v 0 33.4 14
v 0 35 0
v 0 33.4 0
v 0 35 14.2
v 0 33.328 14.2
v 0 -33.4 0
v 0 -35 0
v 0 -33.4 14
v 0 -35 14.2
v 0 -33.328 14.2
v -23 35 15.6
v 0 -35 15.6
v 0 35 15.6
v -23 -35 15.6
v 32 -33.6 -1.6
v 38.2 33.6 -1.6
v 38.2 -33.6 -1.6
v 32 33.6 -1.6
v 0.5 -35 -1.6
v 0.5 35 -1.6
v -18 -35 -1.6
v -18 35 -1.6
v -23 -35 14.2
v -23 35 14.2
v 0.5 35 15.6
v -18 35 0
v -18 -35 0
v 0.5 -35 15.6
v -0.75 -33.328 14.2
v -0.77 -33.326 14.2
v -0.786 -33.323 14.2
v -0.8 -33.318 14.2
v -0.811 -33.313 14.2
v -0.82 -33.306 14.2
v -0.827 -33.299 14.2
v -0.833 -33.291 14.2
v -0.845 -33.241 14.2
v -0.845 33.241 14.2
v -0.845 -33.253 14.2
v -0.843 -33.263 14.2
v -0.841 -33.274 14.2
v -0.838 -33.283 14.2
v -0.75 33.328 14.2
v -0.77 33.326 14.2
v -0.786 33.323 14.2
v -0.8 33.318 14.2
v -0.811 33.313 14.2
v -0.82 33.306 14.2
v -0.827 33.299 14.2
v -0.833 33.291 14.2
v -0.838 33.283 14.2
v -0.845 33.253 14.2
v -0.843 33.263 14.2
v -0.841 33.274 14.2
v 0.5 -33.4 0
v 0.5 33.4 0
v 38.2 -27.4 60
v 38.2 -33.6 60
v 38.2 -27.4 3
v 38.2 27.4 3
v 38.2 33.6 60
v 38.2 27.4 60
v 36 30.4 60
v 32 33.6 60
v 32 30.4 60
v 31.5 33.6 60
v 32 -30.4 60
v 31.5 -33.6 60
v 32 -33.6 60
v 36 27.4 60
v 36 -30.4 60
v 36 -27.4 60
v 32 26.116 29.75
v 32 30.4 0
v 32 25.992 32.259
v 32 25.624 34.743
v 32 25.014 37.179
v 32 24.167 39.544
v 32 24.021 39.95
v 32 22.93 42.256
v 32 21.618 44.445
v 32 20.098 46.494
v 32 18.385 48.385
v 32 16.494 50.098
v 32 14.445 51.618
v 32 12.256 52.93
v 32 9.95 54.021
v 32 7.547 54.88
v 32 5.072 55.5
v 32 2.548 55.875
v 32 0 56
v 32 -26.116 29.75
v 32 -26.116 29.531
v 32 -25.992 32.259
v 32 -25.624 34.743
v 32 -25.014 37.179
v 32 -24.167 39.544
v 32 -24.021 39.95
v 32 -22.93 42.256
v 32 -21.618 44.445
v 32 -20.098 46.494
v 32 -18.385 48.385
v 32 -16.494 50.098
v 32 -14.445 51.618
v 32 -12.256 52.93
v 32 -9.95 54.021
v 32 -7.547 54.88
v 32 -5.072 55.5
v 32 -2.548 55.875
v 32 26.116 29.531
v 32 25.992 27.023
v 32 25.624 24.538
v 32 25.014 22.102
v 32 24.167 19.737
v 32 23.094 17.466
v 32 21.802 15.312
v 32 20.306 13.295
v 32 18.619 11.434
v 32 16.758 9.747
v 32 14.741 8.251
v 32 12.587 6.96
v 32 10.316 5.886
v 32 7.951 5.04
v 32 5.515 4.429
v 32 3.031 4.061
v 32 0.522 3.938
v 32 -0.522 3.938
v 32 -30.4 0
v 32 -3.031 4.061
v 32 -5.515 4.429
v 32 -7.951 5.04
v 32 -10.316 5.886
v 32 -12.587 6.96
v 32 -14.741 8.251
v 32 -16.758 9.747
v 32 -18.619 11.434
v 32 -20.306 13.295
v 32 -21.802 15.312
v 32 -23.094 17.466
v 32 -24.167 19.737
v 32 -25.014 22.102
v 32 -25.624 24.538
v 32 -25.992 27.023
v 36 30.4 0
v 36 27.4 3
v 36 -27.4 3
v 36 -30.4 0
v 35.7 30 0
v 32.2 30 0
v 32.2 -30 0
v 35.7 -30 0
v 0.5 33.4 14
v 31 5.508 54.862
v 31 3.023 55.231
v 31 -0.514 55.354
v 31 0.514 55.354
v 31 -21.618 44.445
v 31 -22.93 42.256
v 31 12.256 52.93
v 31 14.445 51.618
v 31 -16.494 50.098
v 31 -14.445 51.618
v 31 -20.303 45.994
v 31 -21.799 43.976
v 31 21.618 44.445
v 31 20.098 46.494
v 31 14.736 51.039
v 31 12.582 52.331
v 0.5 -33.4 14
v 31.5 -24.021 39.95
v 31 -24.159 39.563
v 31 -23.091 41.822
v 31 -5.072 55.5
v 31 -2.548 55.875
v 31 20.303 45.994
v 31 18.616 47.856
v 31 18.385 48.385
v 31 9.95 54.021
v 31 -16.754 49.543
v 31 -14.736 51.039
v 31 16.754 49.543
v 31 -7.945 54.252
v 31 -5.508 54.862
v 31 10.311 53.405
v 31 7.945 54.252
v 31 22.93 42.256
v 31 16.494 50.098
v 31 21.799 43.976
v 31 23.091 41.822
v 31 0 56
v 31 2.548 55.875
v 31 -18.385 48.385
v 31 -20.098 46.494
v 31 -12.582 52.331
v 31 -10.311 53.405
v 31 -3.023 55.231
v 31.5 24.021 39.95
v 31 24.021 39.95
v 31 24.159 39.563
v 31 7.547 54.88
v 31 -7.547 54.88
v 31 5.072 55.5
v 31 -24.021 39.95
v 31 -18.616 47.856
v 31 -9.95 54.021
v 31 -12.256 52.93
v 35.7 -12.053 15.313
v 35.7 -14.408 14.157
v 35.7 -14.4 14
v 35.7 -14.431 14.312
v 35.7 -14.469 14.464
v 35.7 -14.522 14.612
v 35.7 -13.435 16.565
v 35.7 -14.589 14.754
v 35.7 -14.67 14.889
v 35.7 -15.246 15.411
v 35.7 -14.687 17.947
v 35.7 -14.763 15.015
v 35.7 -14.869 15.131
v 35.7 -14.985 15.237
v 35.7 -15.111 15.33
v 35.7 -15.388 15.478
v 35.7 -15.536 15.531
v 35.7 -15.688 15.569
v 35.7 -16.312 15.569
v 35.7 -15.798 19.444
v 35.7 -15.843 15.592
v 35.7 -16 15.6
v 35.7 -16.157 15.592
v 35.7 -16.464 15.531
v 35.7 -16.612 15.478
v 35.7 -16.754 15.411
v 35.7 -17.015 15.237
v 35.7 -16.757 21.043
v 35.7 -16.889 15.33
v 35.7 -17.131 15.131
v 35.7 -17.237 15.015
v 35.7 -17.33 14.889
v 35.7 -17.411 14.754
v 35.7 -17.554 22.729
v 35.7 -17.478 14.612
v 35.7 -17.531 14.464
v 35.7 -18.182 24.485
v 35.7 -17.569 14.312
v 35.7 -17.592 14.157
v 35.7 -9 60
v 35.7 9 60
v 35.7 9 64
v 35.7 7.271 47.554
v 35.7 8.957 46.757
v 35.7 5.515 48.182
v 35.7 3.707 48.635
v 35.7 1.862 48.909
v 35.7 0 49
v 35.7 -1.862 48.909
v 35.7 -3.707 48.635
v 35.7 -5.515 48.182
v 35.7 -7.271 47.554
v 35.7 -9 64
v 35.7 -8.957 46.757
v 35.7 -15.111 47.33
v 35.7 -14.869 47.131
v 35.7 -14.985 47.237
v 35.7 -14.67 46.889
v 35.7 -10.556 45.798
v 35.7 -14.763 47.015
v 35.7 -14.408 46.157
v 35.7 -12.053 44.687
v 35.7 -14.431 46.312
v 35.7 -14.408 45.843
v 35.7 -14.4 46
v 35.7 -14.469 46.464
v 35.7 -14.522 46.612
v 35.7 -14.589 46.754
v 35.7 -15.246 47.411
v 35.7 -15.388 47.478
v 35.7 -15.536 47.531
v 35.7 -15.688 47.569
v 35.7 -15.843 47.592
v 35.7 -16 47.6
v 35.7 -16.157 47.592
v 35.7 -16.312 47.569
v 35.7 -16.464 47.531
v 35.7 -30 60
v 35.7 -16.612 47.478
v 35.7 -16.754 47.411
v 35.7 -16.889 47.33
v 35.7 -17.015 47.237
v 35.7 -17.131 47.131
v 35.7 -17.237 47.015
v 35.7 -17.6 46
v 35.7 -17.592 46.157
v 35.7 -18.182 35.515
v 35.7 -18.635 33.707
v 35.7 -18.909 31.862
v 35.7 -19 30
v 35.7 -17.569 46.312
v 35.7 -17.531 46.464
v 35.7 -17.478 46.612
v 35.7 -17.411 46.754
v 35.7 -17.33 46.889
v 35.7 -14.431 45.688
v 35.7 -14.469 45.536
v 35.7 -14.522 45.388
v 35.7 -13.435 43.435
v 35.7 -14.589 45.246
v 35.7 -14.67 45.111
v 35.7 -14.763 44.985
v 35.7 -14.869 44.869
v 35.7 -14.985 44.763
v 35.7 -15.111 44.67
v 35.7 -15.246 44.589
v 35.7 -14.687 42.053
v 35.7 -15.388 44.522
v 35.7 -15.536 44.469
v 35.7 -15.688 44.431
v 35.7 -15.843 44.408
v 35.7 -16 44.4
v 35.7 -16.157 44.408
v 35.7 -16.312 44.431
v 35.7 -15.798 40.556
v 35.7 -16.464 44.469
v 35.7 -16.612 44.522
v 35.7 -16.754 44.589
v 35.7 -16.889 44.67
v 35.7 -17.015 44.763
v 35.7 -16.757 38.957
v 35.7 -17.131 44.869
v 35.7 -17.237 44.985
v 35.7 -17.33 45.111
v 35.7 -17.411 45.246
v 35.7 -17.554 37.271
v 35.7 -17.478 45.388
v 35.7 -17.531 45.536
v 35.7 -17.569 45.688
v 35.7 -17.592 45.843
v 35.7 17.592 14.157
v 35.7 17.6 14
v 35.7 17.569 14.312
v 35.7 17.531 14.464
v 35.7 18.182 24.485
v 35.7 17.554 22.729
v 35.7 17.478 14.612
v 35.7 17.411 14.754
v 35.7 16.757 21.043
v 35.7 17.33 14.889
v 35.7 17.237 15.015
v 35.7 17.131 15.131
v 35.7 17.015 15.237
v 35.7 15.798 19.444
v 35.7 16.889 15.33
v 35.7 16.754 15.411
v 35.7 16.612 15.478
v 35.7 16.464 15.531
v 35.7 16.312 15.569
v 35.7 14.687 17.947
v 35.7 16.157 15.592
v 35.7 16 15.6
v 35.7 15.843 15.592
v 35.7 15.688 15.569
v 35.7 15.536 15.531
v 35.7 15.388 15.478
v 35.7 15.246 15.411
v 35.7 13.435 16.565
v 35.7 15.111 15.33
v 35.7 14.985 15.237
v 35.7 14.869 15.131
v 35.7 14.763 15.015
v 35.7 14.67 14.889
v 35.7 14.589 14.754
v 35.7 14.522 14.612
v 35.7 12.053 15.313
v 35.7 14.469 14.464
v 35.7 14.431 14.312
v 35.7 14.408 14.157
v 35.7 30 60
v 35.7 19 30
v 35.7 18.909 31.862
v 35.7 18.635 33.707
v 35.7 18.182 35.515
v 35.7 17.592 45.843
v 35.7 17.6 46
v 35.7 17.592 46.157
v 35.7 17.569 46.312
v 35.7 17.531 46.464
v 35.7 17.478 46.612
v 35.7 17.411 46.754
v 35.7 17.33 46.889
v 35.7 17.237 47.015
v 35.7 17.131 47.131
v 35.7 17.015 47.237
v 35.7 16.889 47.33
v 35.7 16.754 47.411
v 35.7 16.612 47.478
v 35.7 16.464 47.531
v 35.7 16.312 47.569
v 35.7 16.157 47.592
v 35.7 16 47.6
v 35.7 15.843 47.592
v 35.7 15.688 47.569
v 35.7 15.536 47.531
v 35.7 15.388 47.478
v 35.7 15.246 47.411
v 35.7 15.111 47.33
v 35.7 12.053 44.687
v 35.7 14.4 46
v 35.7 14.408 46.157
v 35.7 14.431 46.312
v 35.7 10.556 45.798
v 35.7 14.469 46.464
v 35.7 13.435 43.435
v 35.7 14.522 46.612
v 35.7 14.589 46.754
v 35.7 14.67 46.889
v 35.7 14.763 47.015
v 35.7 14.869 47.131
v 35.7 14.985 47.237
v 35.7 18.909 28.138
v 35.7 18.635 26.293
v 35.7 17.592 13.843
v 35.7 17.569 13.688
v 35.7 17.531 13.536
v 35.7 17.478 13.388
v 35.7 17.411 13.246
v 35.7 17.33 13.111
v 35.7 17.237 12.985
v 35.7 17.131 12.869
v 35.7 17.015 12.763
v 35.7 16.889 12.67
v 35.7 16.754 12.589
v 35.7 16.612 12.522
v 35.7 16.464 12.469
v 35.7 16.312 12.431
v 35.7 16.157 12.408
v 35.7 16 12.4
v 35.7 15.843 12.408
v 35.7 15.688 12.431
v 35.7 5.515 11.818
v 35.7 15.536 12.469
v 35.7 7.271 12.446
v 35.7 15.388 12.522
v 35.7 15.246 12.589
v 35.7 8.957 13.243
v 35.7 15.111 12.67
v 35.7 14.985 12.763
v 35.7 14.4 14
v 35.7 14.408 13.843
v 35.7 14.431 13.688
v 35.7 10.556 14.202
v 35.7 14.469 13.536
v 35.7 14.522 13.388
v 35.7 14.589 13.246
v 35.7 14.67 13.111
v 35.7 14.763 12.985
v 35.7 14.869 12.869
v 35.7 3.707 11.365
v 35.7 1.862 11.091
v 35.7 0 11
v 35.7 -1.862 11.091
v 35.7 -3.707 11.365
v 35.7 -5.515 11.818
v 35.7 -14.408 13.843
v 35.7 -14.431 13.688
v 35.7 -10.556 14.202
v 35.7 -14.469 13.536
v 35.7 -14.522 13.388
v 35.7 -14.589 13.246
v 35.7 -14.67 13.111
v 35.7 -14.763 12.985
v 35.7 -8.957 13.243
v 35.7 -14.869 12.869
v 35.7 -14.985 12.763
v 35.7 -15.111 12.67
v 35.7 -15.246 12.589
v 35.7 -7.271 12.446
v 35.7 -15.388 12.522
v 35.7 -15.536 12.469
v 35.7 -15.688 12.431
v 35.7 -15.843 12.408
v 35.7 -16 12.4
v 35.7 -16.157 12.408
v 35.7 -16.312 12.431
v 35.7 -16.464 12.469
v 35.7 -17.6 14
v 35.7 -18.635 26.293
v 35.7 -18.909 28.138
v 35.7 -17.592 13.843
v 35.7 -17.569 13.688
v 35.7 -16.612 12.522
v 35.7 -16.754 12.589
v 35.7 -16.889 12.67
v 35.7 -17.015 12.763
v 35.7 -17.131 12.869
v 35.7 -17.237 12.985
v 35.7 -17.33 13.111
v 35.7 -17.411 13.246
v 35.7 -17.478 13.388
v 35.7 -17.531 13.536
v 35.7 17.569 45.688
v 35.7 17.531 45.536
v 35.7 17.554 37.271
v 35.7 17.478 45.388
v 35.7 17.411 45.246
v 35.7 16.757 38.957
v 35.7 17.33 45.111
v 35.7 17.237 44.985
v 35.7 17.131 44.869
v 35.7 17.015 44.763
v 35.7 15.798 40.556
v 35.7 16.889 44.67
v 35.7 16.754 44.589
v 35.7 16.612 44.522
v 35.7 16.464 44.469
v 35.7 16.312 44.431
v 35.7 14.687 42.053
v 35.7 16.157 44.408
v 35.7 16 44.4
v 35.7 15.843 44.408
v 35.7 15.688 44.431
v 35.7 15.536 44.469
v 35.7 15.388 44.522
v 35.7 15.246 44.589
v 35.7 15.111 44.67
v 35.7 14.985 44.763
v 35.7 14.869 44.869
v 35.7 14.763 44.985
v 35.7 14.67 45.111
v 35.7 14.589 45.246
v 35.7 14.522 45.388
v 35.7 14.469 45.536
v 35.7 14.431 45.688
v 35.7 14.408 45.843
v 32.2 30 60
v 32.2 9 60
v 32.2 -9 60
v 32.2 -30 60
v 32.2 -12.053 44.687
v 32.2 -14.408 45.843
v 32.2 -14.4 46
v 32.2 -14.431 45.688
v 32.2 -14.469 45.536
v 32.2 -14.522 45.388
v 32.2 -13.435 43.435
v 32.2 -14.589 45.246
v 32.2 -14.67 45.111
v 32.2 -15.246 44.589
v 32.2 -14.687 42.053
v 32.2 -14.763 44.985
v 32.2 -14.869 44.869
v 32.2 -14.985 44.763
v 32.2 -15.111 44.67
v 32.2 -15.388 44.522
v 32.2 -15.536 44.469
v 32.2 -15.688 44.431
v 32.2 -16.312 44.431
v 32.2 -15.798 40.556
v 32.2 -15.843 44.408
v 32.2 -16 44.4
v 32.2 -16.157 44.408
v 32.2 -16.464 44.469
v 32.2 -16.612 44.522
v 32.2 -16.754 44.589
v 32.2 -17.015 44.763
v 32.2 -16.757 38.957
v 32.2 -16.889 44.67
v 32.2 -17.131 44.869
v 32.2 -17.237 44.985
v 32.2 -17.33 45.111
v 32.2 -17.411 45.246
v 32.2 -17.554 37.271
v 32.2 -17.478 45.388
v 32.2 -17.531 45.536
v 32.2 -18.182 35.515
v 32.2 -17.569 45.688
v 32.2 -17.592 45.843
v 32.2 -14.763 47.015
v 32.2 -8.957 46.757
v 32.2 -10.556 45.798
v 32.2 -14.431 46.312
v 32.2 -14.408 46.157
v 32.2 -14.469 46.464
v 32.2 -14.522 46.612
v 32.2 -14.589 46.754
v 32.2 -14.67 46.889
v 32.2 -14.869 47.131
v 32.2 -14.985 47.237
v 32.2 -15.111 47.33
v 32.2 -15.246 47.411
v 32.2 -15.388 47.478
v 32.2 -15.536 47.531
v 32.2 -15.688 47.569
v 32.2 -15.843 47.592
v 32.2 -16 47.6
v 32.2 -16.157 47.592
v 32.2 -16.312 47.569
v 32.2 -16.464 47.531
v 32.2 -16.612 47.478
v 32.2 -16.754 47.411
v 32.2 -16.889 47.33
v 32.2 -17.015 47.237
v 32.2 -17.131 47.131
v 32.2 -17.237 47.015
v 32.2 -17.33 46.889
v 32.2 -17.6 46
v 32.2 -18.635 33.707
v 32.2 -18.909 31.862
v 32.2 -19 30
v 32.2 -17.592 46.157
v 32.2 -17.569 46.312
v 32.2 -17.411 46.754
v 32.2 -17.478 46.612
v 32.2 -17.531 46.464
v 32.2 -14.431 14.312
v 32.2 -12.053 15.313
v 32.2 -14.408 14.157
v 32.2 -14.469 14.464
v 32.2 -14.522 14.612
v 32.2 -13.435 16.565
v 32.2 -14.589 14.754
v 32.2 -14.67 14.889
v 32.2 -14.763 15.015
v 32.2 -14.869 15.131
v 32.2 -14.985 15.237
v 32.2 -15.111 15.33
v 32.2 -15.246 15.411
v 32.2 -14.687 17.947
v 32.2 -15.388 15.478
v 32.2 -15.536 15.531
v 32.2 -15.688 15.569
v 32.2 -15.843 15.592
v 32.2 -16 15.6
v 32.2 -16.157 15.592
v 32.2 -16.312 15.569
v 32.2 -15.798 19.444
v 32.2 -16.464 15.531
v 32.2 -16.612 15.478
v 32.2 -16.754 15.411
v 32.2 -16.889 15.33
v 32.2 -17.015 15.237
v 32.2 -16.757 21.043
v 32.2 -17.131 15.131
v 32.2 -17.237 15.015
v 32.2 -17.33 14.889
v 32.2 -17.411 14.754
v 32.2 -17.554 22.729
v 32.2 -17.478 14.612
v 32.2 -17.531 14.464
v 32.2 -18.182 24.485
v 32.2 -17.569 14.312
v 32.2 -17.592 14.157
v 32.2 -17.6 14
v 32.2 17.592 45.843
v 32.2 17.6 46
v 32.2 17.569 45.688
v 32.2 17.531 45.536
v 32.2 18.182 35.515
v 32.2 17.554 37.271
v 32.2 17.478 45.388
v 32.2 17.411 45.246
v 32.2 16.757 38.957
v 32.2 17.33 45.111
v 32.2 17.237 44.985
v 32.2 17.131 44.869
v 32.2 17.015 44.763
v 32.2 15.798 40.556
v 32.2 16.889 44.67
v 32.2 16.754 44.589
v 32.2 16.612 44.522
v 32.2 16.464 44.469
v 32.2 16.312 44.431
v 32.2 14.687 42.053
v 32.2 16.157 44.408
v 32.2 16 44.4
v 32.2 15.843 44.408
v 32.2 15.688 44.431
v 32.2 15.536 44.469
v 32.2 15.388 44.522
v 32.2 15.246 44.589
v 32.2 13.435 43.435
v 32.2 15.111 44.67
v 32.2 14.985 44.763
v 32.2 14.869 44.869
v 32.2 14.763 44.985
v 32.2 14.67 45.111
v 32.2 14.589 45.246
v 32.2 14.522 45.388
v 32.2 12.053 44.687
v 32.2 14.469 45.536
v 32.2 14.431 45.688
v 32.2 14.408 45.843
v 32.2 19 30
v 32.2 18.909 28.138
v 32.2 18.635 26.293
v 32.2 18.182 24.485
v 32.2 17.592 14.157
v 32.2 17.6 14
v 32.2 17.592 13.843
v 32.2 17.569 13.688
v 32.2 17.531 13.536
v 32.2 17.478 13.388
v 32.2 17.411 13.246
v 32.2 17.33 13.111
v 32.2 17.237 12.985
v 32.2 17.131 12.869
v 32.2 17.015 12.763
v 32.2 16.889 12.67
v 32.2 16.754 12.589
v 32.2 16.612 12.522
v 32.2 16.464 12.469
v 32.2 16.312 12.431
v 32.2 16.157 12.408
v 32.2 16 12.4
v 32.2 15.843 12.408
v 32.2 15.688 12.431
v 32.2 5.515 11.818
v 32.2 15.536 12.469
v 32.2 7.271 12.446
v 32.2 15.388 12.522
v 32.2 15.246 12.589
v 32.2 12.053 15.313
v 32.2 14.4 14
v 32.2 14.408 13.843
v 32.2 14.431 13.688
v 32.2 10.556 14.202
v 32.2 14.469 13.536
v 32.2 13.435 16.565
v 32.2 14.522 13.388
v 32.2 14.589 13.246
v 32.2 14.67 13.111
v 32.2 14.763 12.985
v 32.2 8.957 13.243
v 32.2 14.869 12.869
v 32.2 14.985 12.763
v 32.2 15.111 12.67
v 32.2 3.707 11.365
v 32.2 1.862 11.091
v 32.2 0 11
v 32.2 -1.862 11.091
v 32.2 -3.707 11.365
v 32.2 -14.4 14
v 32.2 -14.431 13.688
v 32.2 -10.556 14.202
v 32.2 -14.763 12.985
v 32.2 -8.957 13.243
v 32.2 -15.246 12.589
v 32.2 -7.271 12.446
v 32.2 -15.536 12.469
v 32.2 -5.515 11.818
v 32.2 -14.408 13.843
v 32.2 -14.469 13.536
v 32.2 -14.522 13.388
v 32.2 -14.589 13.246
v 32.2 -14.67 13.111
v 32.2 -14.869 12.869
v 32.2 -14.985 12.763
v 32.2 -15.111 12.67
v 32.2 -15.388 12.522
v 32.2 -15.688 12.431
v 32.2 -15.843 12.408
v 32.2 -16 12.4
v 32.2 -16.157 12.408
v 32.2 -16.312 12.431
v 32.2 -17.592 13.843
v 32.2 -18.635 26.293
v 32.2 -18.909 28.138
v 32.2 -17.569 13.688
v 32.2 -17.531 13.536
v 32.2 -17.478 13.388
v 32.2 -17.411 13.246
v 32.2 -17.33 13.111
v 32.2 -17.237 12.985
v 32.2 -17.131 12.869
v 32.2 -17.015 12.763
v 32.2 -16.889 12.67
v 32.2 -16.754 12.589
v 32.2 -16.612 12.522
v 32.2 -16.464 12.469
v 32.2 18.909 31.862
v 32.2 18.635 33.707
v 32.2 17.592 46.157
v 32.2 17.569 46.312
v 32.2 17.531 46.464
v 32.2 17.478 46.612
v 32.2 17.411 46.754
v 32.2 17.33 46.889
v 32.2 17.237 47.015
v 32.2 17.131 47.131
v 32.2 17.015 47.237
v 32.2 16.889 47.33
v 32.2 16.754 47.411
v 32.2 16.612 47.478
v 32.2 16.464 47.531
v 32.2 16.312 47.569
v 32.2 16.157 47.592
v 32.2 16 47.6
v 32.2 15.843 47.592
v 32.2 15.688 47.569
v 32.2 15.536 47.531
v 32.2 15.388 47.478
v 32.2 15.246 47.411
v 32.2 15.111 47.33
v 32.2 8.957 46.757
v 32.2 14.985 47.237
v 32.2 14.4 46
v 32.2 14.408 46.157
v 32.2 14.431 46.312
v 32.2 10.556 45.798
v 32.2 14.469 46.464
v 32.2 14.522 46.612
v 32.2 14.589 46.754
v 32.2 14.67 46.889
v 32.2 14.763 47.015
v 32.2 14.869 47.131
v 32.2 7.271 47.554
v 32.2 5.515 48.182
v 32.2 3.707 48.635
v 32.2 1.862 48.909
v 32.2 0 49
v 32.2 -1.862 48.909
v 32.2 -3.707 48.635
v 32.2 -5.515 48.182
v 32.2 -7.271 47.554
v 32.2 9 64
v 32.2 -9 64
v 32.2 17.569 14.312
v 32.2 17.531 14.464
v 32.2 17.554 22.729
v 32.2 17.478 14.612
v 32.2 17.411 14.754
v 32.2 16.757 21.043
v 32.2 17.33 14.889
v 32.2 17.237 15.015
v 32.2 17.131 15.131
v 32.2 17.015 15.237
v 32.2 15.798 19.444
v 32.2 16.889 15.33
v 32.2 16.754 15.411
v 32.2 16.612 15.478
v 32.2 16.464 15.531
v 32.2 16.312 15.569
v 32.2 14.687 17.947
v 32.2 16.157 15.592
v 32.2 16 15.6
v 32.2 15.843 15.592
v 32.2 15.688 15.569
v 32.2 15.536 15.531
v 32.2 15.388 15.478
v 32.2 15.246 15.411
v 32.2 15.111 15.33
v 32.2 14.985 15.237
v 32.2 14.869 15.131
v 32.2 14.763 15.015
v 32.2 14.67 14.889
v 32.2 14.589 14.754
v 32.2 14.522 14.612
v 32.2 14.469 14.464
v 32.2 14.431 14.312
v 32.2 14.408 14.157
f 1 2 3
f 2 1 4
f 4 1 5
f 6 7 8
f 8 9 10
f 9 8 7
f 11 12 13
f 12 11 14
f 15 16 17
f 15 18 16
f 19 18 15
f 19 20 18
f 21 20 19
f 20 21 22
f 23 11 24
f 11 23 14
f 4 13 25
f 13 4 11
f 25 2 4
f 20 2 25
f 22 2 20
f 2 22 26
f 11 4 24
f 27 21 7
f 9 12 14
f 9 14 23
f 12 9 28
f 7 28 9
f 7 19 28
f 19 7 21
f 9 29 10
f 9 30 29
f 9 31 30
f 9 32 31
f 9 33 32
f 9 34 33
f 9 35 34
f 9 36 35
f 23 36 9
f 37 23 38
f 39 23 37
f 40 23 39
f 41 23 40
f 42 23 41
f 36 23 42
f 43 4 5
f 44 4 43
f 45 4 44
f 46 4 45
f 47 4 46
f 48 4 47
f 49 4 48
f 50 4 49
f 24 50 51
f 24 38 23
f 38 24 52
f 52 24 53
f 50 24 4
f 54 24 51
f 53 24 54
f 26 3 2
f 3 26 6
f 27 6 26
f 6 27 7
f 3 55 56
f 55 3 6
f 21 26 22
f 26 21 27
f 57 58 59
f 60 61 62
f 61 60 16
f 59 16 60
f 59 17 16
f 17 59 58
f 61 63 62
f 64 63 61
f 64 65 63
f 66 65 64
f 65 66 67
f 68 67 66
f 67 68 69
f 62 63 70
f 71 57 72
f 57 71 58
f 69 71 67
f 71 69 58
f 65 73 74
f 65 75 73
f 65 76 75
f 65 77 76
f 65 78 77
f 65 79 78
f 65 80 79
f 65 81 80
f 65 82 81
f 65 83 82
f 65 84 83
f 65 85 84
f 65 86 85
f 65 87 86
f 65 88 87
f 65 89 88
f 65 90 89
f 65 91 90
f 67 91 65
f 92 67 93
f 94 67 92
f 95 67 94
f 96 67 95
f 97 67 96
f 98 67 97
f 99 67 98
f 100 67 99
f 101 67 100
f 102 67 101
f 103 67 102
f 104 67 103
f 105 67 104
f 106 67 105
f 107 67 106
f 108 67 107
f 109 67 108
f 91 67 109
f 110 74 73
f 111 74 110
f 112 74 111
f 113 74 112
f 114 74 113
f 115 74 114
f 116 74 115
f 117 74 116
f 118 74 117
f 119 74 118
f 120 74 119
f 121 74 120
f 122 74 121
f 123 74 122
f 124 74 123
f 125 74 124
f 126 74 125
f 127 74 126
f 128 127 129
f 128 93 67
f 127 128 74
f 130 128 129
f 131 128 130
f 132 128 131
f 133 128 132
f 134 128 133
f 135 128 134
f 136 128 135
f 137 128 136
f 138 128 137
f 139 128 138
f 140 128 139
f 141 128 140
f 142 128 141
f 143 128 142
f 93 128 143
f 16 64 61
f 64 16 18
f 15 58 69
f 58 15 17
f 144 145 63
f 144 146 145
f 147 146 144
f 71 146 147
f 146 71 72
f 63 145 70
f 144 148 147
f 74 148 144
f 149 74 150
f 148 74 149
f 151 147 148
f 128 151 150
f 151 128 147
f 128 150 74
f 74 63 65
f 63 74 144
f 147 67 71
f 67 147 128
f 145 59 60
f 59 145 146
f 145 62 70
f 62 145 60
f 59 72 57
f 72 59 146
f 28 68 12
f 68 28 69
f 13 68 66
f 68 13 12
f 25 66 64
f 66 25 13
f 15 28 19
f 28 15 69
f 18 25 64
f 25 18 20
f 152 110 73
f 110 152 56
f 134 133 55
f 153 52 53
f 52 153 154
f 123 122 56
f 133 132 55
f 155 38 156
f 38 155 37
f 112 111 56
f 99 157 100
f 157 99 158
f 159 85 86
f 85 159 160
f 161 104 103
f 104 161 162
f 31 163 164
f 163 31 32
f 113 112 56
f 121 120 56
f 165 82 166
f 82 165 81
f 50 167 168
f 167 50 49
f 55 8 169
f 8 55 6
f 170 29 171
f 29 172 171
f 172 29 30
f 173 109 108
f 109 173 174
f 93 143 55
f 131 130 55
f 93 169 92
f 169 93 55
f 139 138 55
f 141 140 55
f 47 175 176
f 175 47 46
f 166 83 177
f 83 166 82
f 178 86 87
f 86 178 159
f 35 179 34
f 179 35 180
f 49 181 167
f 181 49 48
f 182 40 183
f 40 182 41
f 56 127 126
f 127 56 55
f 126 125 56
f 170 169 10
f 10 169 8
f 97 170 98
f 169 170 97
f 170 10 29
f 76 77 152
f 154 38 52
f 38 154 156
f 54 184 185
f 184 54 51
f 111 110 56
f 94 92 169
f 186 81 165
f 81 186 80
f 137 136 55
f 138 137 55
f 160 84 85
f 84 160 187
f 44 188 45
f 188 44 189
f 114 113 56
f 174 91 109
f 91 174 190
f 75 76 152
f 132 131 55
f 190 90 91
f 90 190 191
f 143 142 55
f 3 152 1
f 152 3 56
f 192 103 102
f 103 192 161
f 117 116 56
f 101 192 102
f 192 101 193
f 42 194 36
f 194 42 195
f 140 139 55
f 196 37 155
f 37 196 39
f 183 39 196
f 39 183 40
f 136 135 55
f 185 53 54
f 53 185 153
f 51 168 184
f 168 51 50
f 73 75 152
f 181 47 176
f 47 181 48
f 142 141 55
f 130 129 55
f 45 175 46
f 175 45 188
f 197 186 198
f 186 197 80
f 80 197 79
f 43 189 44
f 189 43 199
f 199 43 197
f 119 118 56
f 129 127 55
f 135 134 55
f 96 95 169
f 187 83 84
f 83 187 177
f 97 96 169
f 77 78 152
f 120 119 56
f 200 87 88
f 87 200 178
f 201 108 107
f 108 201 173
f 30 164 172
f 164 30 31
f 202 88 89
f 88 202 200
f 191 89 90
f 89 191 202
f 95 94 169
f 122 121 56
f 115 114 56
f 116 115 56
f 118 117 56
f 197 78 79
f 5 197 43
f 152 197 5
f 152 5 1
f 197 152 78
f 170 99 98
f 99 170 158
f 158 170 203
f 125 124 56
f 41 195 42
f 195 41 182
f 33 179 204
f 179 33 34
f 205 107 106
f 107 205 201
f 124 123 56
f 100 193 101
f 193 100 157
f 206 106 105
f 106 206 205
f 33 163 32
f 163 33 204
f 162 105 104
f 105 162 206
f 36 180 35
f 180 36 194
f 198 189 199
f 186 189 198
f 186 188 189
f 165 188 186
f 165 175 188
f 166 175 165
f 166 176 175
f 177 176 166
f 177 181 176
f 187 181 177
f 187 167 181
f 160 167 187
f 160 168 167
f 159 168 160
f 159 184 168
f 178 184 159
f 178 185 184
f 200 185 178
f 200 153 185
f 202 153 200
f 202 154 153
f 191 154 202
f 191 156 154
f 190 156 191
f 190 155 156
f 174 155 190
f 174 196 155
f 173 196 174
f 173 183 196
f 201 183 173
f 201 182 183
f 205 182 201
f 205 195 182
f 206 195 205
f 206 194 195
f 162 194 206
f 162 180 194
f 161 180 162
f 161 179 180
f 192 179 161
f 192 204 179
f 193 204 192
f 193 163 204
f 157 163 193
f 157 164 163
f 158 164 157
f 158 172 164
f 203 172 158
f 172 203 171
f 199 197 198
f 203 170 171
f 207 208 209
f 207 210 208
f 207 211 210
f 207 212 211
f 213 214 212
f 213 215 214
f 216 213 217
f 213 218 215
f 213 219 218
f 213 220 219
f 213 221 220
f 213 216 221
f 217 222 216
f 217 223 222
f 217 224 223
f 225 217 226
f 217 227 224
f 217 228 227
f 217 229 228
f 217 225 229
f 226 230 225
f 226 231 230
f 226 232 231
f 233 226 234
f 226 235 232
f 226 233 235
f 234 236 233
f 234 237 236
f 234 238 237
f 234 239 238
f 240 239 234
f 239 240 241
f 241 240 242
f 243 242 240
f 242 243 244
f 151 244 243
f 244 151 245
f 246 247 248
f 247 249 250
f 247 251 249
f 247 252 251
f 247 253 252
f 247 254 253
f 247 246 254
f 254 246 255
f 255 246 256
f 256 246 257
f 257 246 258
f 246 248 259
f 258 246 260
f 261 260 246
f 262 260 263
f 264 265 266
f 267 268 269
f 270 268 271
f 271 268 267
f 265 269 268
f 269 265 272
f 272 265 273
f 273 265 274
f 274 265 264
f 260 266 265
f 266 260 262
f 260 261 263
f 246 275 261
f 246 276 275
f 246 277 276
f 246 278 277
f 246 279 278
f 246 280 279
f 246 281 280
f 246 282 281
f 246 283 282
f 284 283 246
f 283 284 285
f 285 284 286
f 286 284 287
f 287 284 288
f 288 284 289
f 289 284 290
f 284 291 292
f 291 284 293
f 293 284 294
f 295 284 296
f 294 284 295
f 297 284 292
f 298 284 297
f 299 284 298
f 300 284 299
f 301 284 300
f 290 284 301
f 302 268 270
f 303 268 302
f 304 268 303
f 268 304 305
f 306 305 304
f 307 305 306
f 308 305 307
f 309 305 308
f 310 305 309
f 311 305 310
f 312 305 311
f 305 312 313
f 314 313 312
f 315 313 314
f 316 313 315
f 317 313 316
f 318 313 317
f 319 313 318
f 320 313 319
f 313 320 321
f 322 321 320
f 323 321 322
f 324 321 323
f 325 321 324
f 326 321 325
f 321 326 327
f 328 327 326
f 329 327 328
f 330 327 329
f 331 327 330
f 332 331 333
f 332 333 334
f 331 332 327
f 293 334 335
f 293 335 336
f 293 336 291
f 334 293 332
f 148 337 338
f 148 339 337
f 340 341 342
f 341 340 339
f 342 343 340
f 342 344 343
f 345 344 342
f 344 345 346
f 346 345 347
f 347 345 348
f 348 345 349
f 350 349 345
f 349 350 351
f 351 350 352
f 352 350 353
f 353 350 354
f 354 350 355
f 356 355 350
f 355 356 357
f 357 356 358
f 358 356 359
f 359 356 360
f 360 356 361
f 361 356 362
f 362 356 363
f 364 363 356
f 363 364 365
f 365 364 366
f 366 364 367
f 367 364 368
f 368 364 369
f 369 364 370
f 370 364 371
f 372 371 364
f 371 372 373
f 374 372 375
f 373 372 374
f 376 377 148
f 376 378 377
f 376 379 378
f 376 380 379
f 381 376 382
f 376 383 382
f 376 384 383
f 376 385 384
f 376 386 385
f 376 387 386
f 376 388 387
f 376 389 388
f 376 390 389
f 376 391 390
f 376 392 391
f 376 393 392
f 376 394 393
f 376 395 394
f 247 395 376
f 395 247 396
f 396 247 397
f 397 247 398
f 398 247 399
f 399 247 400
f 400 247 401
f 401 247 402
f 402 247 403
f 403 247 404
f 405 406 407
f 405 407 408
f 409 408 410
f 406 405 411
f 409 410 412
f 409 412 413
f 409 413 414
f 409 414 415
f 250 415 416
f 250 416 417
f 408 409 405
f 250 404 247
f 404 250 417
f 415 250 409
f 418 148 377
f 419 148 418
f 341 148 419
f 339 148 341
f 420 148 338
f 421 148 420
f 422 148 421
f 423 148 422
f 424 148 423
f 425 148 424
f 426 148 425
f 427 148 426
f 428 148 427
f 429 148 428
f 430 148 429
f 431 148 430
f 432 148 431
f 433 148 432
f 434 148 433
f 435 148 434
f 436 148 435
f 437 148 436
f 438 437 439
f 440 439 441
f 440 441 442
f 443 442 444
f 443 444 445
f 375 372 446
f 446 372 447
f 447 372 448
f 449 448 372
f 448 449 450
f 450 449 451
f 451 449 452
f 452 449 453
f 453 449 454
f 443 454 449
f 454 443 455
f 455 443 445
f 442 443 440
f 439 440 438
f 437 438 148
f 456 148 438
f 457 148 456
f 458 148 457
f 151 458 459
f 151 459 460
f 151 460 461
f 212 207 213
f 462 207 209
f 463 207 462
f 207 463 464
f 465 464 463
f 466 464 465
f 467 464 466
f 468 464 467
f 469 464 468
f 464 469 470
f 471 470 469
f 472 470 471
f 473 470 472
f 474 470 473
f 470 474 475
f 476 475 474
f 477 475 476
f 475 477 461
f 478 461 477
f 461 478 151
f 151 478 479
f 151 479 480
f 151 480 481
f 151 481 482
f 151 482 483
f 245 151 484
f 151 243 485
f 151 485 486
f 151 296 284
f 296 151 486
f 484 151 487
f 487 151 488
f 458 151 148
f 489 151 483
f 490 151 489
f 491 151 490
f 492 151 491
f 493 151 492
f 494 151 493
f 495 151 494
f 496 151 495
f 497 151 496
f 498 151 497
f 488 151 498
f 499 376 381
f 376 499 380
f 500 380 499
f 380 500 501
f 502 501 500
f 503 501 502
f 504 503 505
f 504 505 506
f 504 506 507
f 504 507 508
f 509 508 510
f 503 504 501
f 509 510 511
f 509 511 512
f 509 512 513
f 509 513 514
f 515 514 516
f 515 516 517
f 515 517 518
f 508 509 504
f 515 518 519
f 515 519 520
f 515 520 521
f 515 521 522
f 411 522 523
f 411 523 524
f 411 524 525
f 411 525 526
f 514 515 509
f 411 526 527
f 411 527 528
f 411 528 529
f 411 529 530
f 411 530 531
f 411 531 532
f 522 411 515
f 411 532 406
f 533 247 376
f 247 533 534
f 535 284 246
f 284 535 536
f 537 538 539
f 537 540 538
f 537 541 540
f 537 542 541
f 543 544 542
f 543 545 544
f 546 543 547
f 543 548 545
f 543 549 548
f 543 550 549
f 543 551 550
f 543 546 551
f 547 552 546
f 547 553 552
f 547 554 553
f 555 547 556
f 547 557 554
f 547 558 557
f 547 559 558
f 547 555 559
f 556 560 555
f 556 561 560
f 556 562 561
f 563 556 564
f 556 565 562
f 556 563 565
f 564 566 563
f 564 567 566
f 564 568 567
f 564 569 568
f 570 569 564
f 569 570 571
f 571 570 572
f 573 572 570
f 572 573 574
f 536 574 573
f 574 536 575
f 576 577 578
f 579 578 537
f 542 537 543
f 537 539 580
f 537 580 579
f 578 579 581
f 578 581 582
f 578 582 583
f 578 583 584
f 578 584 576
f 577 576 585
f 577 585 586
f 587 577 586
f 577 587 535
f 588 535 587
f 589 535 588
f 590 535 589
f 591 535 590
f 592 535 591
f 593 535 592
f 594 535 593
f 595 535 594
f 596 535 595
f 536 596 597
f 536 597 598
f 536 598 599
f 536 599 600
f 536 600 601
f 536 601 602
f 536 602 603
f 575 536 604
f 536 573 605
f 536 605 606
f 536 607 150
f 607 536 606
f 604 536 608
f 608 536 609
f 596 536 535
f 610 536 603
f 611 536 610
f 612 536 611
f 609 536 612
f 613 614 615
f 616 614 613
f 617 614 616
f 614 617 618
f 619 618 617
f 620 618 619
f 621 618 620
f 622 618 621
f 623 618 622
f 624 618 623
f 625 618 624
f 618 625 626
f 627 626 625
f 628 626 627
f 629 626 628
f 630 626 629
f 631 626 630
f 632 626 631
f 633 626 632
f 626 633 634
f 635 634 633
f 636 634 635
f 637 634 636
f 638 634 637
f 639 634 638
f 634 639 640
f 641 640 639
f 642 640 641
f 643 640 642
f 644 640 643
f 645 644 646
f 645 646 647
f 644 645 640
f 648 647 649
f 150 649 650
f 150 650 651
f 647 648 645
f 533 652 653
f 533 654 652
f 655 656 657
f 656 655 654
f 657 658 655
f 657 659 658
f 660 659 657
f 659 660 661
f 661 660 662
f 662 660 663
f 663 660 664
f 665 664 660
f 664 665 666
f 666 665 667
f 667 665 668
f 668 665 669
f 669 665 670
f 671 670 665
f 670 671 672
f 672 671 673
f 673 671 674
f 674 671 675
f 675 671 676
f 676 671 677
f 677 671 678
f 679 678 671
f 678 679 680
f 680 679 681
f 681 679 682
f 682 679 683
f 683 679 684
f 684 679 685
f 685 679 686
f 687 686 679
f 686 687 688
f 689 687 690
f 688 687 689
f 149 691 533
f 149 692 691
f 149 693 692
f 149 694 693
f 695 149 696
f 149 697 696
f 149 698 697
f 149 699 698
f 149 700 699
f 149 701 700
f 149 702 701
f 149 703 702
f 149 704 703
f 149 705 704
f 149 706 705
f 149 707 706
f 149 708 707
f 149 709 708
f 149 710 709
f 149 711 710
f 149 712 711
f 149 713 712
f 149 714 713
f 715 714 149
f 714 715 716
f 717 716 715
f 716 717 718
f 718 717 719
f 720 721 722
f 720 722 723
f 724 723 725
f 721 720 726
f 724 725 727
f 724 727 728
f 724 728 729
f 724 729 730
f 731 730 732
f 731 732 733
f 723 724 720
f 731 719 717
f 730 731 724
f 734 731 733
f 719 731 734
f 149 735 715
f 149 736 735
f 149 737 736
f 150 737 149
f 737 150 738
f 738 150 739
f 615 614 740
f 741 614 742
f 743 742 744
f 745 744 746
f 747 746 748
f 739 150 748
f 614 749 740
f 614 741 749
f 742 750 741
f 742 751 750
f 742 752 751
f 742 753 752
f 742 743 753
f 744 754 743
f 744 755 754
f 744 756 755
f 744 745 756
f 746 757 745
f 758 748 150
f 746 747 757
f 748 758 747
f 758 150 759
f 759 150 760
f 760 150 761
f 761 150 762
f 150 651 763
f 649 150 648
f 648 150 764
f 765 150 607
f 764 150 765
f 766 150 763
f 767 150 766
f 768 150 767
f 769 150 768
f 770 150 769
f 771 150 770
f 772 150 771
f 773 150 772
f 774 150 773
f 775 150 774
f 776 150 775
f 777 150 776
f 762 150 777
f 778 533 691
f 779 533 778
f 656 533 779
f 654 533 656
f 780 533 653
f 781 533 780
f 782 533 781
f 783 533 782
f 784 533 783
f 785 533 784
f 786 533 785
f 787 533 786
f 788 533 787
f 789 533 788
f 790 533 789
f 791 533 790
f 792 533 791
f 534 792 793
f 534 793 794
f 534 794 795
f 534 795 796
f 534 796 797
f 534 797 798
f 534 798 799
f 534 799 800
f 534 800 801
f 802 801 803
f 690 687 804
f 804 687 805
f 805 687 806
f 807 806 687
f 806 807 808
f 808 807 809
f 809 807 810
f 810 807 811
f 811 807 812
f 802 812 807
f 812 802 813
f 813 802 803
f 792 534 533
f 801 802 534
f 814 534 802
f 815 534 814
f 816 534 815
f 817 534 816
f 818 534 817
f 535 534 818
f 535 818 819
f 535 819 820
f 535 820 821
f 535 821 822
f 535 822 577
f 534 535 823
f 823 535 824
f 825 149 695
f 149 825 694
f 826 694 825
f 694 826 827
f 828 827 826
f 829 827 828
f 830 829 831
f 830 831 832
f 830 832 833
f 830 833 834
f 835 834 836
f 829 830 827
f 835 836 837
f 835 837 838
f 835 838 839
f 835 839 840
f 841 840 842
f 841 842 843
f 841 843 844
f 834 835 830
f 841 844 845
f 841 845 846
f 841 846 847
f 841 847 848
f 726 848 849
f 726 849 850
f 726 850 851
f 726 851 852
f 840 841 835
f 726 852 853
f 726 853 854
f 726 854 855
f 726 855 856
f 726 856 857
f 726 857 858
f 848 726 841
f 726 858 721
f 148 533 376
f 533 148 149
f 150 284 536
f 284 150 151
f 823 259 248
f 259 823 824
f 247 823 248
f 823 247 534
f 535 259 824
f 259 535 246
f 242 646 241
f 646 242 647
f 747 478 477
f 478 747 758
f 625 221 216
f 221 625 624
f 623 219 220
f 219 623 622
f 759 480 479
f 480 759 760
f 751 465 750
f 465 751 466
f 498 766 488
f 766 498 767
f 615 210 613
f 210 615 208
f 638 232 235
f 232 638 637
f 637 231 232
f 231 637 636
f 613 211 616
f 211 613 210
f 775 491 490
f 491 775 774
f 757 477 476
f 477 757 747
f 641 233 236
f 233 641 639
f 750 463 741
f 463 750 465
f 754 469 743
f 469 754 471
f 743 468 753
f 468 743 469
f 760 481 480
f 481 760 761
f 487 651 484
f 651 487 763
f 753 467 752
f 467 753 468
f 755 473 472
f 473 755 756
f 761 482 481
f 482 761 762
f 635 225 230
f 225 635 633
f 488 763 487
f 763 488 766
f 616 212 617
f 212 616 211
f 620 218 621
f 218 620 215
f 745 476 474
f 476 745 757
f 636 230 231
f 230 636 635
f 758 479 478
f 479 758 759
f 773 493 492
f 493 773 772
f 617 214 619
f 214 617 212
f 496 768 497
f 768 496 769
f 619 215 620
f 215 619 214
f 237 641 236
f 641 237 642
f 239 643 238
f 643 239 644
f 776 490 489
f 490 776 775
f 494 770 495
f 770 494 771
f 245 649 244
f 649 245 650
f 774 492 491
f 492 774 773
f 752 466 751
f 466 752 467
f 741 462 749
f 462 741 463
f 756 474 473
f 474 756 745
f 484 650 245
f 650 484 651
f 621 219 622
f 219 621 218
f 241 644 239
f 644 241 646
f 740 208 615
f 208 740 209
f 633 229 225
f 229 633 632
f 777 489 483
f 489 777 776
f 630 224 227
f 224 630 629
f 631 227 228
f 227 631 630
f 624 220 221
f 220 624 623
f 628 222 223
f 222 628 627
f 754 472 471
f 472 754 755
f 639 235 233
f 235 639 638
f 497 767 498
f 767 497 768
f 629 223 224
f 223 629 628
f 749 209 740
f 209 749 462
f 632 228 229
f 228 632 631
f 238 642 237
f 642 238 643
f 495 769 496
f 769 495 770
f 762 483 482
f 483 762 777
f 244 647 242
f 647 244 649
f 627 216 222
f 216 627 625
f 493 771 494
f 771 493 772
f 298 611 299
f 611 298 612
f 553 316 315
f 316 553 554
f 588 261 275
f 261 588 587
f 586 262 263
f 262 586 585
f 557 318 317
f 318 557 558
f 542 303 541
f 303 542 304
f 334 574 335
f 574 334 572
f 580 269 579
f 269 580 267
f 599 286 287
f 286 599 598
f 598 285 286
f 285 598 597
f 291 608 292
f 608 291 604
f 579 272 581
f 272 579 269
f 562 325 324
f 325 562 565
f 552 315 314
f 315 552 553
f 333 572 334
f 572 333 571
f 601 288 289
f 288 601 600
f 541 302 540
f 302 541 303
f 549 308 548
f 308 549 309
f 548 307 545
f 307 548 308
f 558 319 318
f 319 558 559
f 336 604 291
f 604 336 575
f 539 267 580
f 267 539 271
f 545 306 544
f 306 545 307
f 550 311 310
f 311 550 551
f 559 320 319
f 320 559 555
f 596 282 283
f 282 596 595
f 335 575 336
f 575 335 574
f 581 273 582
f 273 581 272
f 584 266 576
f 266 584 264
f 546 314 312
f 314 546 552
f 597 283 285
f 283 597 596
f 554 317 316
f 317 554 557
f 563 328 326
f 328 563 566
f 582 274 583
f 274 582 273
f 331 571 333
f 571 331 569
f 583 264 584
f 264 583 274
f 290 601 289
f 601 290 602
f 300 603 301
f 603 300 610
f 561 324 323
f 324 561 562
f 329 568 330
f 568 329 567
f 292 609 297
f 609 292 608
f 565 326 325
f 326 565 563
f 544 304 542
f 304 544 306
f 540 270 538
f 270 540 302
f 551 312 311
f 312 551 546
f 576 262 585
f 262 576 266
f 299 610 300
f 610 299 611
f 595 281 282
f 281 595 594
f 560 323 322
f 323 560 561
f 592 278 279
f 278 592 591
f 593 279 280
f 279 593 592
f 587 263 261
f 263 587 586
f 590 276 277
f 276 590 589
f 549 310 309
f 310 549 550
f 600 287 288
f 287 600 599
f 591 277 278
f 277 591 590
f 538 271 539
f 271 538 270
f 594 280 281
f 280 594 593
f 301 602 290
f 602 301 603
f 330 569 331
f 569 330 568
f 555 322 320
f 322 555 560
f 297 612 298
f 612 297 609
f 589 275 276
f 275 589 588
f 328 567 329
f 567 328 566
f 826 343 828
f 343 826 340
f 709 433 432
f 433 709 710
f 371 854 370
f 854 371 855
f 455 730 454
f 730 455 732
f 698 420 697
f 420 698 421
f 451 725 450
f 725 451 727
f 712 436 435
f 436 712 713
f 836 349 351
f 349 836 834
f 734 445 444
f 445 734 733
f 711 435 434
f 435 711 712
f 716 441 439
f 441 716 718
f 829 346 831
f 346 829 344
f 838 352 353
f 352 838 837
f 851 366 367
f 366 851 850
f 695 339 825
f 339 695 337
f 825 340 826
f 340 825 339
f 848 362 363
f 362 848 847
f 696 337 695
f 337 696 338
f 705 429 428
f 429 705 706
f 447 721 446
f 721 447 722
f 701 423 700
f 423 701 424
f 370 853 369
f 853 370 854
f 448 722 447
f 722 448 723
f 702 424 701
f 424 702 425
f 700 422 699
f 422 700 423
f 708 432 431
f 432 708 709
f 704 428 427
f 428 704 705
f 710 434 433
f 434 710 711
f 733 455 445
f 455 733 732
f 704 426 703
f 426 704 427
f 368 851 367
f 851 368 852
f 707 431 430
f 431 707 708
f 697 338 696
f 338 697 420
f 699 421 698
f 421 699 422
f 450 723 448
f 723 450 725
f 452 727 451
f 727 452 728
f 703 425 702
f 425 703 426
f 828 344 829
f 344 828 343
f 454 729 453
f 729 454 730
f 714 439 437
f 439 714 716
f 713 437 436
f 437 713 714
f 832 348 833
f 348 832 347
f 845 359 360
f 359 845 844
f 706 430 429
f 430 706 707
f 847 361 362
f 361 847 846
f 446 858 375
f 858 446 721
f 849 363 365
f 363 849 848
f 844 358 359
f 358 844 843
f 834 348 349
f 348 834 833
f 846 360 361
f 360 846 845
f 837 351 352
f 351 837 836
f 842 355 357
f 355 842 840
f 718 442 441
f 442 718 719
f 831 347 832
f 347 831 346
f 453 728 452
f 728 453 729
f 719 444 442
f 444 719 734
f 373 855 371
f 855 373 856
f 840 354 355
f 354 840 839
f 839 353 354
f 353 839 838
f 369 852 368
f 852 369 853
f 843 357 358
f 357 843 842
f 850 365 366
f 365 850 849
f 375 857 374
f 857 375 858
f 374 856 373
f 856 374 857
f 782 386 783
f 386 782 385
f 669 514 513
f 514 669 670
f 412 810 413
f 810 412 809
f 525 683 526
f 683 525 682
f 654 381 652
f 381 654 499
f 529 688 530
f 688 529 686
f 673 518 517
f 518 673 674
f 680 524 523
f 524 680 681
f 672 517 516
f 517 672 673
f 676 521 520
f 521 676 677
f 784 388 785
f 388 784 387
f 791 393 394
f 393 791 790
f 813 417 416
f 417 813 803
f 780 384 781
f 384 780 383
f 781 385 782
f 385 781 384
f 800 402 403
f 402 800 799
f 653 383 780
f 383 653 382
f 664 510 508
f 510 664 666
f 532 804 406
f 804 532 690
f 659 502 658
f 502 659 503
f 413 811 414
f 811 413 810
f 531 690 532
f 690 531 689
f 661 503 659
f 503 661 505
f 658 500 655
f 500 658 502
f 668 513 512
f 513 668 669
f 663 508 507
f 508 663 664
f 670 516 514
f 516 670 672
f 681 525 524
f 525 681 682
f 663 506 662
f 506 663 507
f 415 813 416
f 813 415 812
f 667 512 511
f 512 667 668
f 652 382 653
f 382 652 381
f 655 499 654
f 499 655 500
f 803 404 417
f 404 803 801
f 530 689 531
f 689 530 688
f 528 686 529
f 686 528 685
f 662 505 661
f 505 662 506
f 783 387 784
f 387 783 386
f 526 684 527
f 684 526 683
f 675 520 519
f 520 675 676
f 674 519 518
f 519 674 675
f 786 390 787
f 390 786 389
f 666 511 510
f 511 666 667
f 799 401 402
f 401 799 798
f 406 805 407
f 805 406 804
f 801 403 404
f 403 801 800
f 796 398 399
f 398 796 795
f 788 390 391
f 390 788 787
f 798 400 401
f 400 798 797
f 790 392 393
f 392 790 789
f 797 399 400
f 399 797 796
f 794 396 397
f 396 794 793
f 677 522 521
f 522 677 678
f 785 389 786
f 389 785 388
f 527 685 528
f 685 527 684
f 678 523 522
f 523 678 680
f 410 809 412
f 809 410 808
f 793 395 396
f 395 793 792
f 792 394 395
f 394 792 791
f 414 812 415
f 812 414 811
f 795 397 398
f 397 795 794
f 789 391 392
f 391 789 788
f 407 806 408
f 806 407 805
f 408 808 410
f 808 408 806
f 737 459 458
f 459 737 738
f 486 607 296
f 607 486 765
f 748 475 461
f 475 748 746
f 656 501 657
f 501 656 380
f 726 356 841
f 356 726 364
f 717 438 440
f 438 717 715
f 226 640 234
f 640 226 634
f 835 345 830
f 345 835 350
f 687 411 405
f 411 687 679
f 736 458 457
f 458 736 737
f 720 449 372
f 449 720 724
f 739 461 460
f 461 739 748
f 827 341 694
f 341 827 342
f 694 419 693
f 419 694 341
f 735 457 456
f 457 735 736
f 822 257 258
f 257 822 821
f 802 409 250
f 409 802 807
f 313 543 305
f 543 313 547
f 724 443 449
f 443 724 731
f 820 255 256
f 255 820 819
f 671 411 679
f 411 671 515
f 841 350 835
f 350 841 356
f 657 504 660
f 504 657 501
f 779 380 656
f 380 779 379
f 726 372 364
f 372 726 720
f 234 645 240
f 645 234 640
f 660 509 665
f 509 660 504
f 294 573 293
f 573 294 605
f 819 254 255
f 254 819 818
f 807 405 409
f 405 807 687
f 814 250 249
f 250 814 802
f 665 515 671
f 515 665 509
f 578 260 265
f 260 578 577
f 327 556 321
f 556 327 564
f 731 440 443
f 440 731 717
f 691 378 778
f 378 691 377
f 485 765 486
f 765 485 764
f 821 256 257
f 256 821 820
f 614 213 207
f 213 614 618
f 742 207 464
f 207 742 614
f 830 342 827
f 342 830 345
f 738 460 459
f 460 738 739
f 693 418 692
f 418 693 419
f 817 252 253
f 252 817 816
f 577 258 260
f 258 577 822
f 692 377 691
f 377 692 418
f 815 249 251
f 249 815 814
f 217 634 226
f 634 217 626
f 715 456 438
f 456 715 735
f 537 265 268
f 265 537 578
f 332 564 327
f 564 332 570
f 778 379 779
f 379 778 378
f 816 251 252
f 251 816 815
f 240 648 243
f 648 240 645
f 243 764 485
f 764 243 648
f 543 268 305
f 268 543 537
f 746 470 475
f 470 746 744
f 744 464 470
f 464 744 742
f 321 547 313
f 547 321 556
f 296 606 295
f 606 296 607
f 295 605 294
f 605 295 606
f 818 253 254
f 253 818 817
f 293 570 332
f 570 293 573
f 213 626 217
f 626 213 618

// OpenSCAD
// Dell Latitude E7440 Modular Universal Fan Duct & Slide-in Faceplate System
// Parametric OpenSCAD Model

$fn = 64;

// -------------------------------------------------------------
// SELECT WHAT TO RENDER:
// 1 = Full Assembled Preview (Duct + Delta 4028 Plate inserted)
// 2 = Universal Duct Only (Prints alone)
// 3 = Delta PFB0412EN-E (40x40x28mm) Slide-in Faceplate Only
// 4 = Bonus 60mm Fan Slide-in Faceplate Only
// -------------------------------------------------------------
render_mode = 1;

// 1. LAPTOP & VENT EXACT MEASUREMENTS (mm)
laptop_thick     = 14.0; // User measurement: 1.4 cm max laptop thickness
vent_width       = 58.0; // User measurement: 5.8 cm vent width
vent_height      = 10.0; // User measurement: 1.0 cm vent height

// 2. CLAMP / COMPLIANT LIP DIMENSIONS (mm)
top_lip_length   = 23.0; // User exact measurement: 2.3 cm deck overlap
bottom_lip_length= 18.0; // Bottom base overlap (18mm)
clip_width       = 70.0; // 70mm width (seals 6mm past 58mm vent)
t_wall           = 1.6;  // Uniform thin shell wall thickness
t_tip            = 0.75; // Ultra-thin, flexible tip

// 3. DUCT CONE & UNIVERSAL RECEIVER (mm)
cone_length      = 32.0; // Transition cone length
plate_w          = 60.0; // Universal carrier plate width
plate_h          = 60.0; // Universal carrier plate height
plate_t          = 3.5;  // Carrier plate thickness

slot_w           = 60.8; // Slide-in slot width (0.8mm clearance)
slot_t           = 4.0;  // Slide-in slot thickness (0.5mm clearance)
rail_lip         = 3.0;  // Front retaining lip overlap on sides
rail_t           = 2.2;  // Front retaining lip thickness

frame_w          = slot_w + 2 * 3.2; // 67.2mm outer receiver width
frame_h          = plate_h + t_wall;  // 61.6mm outer receiver height
fan_cz           = plate_h / 2.0;     // 30.0mm (airway axis height)

// 4. DELTA PFB0412EN-E (40x40x28mm) SPECS
delta_hole_pitch = 32.0; // 32mm center-to-center
delta_hole_d     = 3.2;  // M3 screw hole
delta_bore       = 38.0; // 38mm blade opening

// 5. BONUS 60MM FAN SPECS
fan60_pitch      = 50.0; // 50mm center-to-center
fan60_hole_d     = 4.2;  // M4 screw hole
fan60_bore       = 54.0; // 54mm blade opening


module clip_base() {
    difference() {
        translate([-top_lip_length, -clip_width/2, -t_wall])
            cube([top_lip_length, clip_width, laptop_thick + 2*t_wall]);
        
        // Laptop slot (14.2mm for smooth fit)
        translate([-top_lip_length - 1, -clip_width/2 - 1, 0])
            cube([top_lip_length + 2, clip_width + 2, laptop_thick + 0.2]);
        
        // Shorter bottom lip cut
        translate([-top_lip_length - 1, -clip_width/2 - 1, -t_wall - 1])
            cube([top_lip_length - bottom_lip_length + 1, clip_width + 2, t_wall + 2]);
    }
}

module duct_transition() {
    hull() {
        translate([0, -clip_width/2, -t_wall])
            cube([0.5, clip_width, laptop_thick + 2*t_wall]);
        
        translate([cone_length - 0.5, -frame_w/2, -t_wall])
            cube([0.5, frame_w, frame_h]);
    }
}

module receiver_frame() {
    difference() {
        // Outer receiver block
        translate([cone_length, -frame_w/2, -t_wall])
            cube([slot_t + rail_t, frame_w, frame_h]);
        
        // Slide-in slot (open at top Z > plate_h)
        translate([cone_length, -slot_w/2, 0])
            cube([slot_t, slot_w, plate_h + 10]);
        
        // Front window between retaining rails
        translate([cone_length + slot_t - 0.5, -(slot_w - 2*rail_lip)/2, rail_lip])
            cube([rail_t + 2, slot_w - 2*rail_lip, plate_h - rail_lip + 10]);
    }
}

module inner_airway() {
    hull() {
        translate([-1, -(clip_width - 2*t_wall)/2, 0])
            cube([1.5, clip_width - 2*t_wall, laptop_thick]);
        
        translate([cone_length - 0.5, 0, fan_cz])
            rotate([0, 90, 0])
                cylinder(d = 52.0, h = 1.0);
    }
    
    // Pass-through bore to receiver slot
    translate([cone_length - 1, 0, fan_cz])
        rotate([0, 90, 0])
            cylinder(d = 52.0, h = slot_t + 2);
}

module universal_duct() {
    difference() {
        union() {
            clip_base();
            duct_transition();
            receiver_frame();
        }
        inner_airway();
    }
}

module faceplate_delta_4028() {
    difference() {
        union() {
            // Main 60x60 carrier plate
            translate([0, -plate_w/2, 0])
                cube([plate_t, plate_w, plate_h]);
            
            // Top pull-tab for easy slide-in & removal
            translate([0, -9, plate_h])
                cube([plate_t, 18, 4]);
        }
        
        // 38mm circular bore
        translate([-1, 0, fan_cz])
            rotate([0, 90, 0])
                cylinder(d = delta_bore, h = plate_t + 2);
        
        // 4x M3 screw holes (32x32mm pitch)
        for (dy = [-delta_hole_pitch/2, delta_hole_pitch/2]) {
            for (dz = [-delta_hole_pitch/2, delta_hole_pitch/2]) {
                translate([-1, dy, fan_cz + dz])
                    rotate([0, 90, 0])
                        cylinder(d = delta_hole_d, h = plate_t + 2);
            }
        }
    }
}

module faceplate_60mm() {
    difference() {
        union() {
            translate([0, -plate_w/2, 0])
                cube([plate_t, plate_w, plate_h]);
            
            translate([0, -9, plate_h])
                cube([plate_t, 18, 4]);
        }
        
        // 54mm circular bore
        translate([-1, 0, fan_cz])
            rotate([0, 90, 0])
                cylinder(d = fan60_bore, h = plate_t + 2);
        
        // 4x M4 screw holes (50x50mm pitch)
        for (dy = [-fan60_pitch/2, fan60_pitch/2]) {
            for (dz = [-fan60_pitch/2, fan60_pitch/2]) {
                translate([-1, dy, fan_cz + dz])
                    rotate([0, 90, 0])
                        cylinder(d = fan60_hole_d, h = plate_t + 2);
            }
        }
    }
}

// -------------------------------------------------------------
// EXECUTE RENDER SELECTION
// -------------------------------------------------------------
if (render_mode == 1) {
    // Assembled preview
    color("LightBlue") universal_duct();
    color("Crimson") translate([cone_length + 0.2, 0, 0]) faceplate_delta_4028();
} else if (render_mode == 2) {
    universal_duct();
} else if (render_mode == 3) {
    faceplate_delta_4028();
} else if (render_mode == 4) {
    faceplate_60mm();
}
